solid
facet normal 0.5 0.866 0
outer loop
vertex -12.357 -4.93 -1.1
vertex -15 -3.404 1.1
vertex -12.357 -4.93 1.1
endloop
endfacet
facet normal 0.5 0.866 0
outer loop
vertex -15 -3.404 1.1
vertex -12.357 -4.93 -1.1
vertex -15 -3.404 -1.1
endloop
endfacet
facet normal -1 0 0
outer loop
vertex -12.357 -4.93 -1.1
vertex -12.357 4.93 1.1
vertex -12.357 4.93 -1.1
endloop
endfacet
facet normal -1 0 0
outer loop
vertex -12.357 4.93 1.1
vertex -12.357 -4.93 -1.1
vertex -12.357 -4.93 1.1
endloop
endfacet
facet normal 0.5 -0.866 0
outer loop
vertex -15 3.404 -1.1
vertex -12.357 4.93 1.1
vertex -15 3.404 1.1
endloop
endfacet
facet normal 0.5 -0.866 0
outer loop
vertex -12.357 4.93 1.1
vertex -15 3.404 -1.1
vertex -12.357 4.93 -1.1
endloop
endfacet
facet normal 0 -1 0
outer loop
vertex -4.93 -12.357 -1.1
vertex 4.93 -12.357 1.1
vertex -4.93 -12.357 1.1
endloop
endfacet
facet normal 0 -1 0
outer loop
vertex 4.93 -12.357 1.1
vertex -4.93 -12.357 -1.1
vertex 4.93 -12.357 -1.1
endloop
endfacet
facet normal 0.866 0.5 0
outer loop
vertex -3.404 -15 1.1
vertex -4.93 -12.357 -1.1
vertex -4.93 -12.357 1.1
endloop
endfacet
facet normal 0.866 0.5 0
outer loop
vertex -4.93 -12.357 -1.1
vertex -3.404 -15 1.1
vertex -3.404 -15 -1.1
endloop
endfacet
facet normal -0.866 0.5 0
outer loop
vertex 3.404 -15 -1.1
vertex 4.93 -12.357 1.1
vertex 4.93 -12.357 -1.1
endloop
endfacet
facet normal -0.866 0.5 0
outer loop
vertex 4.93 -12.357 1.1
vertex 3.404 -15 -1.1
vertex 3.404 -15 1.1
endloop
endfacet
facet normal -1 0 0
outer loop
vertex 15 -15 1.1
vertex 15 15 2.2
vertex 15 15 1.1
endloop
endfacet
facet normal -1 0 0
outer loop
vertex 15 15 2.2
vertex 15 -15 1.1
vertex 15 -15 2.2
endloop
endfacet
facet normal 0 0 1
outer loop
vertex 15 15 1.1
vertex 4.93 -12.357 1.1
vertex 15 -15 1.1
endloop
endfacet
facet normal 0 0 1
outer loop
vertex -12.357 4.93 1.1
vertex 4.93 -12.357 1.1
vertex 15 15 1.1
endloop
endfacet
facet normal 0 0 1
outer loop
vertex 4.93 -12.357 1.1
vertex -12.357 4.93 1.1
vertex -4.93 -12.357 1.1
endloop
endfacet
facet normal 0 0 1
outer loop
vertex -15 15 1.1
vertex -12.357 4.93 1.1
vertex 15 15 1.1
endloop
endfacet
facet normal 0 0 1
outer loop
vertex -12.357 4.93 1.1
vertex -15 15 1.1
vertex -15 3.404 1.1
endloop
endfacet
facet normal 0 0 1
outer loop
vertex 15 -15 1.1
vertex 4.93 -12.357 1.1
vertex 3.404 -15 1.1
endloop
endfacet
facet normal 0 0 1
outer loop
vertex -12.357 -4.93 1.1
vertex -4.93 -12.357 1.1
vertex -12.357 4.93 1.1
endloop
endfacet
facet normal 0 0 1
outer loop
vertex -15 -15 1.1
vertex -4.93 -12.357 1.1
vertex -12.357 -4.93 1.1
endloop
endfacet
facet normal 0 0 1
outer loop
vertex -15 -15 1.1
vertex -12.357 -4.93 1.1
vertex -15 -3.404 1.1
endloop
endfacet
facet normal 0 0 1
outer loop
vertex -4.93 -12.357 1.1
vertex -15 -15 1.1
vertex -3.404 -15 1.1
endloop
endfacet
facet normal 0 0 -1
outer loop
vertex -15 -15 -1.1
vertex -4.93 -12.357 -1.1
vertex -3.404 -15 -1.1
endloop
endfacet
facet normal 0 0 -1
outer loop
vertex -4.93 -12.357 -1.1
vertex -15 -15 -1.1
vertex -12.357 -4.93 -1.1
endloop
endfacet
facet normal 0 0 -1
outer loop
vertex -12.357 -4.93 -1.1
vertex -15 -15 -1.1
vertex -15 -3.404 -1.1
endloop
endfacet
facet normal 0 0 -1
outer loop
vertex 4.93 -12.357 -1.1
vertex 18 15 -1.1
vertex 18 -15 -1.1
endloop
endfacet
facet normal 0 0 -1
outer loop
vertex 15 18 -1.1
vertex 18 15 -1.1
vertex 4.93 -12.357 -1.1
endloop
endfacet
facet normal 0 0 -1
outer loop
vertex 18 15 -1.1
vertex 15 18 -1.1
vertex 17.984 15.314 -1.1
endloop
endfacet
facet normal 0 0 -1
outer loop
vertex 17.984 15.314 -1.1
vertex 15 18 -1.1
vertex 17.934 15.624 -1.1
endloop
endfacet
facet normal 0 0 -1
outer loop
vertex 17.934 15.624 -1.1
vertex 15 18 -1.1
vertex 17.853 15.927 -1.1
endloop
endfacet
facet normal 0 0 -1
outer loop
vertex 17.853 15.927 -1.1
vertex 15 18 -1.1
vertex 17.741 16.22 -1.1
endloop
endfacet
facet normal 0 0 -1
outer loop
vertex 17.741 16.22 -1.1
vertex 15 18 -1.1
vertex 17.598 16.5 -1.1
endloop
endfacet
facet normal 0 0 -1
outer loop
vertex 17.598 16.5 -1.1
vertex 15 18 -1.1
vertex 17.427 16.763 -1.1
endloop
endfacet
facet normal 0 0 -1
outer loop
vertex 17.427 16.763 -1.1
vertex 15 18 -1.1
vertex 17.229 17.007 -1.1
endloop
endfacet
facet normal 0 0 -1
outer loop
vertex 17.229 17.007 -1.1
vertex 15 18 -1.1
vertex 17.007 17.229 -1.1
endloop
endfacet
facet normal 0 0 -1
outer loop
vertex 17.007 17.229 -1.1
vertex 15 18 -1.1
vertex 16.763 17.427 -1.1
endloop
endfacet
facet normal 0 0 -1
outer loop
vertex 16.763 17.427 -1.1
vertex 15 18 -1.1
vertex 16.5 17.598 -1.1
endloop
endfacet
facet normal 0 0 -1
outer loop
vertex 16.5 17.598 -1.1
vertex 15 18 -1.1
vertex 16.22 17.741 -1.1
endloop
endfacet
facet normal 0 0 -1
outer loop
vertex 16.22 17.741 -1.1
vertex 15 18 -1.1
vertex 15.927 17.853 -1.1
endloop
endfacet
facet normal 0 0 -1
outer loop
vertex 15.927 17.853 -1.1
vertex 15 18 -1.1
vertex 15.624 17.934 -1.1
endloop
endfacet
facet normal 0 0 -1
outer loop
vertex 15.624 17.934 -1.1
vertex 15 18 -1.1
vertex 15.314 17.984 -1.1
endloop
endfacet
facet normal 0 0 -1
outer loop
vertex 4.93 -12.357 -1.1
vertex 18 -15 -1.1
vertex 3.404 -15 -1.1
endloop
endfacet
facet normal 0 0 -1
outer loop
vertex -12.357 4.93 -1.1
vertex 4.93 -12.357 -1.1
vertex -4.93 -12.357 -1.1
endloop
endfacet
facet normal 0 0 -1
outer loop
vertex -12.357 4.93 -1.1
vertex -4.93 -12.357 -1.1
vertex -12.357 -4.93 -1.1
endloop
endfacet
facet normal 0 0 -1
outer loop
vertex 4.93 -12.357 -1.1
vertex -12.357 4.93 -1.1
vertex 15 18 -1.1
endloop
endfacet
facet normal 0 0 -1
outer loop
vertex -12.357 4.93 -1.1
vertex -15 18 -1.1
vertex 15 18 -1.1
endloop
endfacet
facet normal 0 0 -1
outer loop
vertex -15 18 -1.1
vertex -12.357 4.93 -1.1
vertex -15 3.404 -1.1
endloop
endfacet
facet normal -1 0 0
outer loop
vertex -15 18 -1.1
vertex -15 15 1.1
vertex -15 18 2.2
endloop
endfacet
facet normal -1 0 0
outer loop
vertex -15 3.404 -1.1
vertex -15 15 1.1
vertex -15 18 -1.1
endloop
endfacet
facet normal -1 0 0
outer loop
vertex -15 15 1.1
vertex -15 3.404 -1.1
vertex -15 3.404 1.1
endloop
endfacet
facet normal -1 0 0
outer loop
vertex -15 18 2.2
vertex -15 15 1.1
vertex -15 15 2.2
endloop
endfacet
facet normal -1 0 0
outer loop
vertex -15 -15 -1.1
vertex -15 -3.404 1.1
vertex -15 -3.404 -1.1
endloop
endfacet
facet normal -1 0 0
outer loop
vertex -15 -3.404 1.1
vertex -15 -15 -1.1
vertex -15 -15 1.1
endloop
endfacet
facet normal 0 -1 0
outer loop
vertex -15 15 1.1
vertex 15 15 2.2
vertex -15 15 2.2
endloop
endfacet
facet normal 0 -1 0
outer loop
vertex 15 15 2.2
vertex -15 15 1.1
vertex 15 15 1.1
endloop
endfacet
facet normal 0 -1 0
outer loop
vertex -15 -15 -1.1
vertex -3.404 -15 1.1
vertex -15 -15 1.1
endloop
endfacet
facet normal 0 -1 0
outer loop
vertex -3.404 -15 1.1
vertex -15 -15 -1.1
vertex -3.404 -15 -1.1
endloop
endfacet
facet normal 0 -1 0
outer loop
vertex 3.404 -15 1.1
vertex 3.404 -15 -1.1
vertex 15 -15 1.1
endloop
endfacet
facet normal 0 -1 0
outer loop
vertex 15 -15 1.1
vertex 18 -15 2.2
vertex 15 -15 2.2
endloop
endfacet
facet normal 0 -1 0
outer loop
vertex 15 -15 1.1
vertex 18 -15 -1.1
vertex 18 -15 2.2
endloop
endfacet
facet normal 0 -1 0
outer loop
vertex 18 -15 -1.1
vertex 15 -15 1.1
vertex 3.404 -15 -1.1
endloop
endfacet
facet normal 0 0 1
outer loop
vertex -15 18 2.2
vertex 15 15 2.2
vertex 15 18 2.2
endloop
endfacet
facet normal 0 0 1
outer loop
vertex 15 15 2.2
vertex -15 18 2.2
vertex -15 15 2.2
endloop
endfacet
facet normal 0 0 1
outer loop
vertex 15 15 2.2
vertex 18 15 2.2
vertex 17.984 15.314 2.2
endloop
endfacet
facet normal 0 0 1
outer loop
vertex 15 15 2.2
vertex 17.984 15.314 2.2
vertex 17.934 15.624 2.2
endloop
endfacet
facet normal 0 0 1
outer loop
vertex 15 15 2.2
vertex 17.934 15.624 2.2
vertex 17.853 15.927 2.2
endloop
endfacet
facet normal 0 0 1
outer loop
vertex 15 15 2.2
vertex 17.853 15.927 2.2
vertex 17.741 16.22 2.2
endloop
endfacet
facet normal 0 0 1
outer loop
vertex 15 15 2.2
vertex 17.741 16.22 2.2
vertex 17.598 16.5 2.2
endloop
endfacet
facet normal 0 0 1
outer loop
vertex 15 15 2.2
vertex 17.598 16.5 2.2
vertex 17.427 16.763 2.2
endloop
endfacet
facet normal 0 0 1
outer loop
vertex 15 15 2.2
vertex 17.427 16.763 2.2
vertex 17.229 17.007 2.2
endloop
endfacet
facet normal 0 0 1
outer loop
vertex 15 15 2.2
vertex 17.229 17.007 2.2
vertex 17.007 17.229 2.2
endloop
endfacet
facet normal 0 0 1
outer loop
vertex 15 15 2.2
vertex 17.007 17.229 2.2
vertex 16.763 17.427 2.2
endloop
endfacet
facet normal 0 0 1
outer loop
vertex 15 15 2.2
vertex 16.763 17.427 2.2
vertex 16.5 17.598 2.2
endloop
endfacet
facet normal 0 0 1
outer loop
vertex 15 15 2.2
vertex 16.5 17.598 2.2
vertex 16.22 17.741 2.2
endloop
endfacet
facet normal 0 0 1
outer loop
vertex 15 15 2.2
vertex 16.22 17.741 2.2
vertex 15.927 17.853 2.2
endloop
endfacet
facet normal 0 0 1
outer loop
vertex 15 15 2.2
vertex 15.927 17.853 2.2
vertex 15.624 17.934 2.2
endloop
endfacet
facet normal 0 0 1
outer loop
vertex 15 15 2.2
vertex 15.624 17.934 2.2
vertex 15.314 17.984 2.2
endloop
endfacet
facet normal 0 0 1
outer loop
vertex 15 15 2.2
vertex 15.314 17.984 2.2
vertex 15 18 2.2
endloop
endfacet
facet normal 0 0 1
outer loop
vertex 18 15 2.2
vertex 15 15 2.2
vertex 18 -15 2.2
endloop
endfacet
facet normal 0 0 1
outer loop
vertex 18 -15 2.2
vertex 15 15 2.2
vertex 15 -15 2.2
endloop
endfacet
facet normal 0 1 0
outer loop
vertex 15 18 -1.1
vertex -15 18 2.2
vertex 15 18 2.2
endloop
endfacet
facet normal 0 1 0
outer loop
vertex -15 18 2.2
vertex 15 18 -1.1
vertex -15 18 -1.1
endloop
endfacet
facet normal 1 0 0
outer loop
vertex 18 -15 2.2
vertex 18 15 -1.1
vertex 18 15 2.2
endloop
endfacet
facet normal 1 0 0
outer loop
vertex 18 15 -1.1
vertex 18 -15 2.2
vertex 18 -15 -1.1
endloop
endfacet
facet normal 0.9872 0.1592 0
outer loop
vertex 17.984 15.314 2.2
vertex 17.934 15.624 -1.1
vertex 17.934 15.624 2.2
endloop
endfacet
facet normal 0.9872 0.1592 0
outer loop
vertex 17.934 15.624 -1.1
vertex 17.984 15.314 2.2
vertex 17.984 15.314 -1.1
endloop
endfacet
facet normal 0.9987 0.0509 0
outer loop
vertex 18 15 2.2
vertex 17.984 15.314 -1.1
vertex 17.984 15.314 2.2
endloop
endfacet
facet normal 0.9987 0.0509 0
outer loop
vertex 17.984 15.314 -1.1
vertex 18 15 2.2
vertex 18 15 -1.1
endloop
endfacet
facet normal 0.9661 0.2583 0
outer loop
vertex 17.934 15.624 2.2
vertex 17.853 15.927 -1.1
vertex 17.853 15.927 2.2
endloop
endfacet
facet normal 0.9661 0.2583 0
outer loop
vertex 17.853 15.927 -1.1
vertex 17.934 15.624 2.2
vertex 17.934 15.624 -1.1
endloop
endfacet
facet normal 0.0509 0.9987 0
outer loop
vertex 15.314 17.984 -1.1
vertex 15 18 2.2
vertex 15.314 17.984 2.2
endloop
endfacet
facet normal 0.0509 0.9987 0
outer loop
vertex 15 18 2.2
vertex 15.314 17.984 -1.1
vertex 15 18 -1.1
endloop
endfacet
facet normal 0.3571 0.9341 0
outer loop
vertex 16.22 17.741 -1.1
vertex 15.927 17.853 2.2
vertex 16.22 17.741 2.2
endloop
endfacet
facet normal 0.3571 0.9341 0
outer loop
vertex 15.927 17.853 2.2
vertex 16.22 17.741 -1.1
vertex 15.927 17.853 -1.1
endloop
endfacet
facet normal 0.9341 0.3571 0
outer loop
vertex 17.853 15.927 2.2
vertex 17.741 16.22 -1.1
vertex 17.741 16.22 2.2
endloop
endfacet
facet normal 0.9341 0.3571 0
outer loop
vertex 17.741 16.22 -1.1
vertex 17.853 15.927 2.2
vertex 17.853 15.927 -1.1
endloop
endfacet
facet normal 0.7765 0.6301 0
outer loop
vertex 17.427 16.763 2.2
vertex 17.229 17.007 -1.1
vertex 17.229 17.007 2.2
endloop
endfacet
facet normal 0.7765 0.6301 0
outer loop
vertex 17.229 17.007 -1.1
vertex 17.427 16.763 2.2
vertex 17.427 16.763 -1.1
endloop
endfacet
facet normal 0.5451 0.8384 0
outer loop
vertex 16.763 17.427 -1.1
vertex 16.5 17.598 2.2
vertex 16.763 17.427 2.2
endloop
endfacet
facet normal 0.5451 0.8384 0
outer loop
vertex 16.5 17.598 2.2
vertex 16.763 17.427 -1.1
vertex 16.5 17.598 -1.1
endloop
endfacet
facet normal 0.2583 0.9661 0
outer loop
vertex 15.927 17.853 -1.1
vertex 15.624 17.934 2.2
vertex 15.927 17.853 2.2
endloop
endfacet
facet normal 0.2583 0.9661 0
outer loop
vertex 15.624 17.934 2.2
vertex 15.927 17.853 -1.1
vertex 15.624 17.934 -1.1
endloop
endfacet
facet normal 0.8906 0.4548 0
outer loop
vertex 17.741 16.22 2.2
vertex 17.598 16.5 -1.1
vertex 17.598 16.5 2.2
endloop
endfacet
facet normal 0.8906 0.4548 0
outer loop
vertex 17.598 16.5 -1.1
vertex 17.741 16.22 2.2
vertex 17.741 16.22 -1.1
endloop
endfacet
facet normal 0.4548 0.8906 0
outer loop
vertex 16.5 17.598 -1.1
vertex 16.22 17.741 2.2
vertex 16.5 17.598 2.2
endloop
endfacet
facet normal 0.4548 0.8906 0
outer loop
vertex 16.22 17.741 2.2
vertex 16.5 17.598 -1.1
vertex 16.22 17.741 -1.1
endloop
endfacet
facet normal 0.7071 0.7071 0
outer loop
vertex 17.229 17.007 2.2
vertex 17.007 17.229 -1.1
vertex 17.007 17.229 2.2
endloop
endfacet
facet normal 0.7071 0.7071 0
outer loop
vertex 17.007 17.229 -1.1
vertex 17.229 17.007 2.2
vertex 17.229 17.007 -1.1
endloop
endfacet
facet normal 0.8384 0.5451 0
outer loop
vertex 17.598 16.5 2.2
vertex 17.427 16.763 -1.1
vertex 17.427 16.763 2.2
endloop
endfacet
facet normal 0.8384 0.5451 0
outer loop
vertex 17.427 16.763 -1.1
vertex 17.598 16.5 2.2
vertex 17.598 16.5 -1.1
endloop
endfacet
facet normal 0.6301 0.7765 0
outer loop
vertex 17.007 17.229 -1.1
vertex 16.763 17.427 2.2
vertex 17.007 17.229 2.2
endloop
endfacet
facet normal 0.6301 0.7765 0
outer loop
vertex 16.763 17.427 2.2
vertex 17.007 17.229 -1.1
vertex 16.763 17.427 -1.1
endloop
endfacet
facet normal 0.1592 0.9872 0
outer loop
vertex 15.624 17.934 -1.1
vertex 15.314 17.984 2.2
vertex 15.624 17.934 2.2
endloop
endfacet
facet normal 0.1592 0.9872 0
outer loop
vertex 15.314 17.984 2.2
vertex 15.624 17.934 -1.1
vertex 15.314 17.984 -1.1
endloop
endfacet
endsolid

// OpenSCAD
/*
 * Based on https://www.thingiverse.com/thing:1732292
 *
 * Rewritten for better readability and added a variable to allow for variable
 * connector heights. Renamed some variables/modules to make things more consistent.
 *
 * Roy Sigurd Karlsbakk <roy@karlsbakk.net>
 *
 */

side=30;
//thickness of the board
thickness=2.2;
edge_thickness=3;
connector_height=thickness;
//coefficient of the thickness of the board
edge_height_coef=1.5;//[1:0.1:3]

// printer tolerance (only affect "color 02" parts)
tolerance=0.3;//[0:0.05:0.7]
// definition (only affect corners)
$fn=60;
// [Corner color 01,Corner color 02,Edge color 01,Edge color 02,Center color 01,Center color 02,Test part]
render="Corner color 2";

////////
module slot() {
    translate([-side/2,0,-thickness/2-0.2]) {
        rotate([0,0,180]) {
            translate([0.2,0,0]) {
                hull() {
                    for(i=[-1,1]) {
                        translate([-0.5-2*tolerance/1.75,i*(0.866+2*tolerance),0]) {
                            cylinder(d=8,h=connector_height+0.5,$fn=3);
                        }
                    }
                }
            }
        }
    }
}
module color1(a) {
    cube([side,side,thickness],center=true);
    for(i=[0,90]) {
        rotate([0,0,i]) {
            translate([-side/2,0,-thickness/2]) {
                cylinder(d=10,h=connector_height,$fn=3);
            }
        }
    }
    if (a==2) {
        for(i=[0,-90]) {
            rotate([0,0,i]) {
                translate([-side/2,side/2,-thickness/2]) {
                    cube([side,edge_thickness,edge_height_coef*thickness]);
                }
            }
        }
        difference() {
            translate([side/2,side/2,-thickness/2]) {
                cylinder(r=edge_thickness,h=edge_height_coef*thickness);
            }
            cube([side,side,2*edge_height_coef*thickness],center=true);
        }
    }
    if (a==3) {
        rotate([0,0,180]) {
            translate([-side/2,0,-thickness/2]) {
                cylinder(d=10,h=connector_height,$fn=3);
            }
        }
        translate([-side/2,side/2,-thickness/2]) {
            cube([side,edge_thickness,edge_height_coef*thickness]);
        }
    } else if (a==4) {
        for(i=[180,-90]) {
            rotate([0,0,i]) {
                translate([-side/2,0,-thickness/2]) {
                    cylinder(d=10,h=connector_height,$fn=3);
                }
            }
        }
    }
    else {};
}

module color2(a) {
    difference() {
        cube([side,side,thickness],center=true);
        for(i=[0,90]) {
            rotate([0,0,i]) {
                slot();
            }
        }
        if (a==3) {
            rotate([0,0,180]) {
                 slot();
            }
        }
        else if (a==4) {
            for(i=[180,-90]) {
                rotate([0,0,i]) {
                    slot();
                }
            }
        }
        else {};
    }
    if (a==2) {
        for(i=[0,-90]) {
            rotate([0,0,i]) {
                translate([-side/2,side/2,-thickness/2]) {
                    cube([side,edge_thickness,edge_height_coef*thickness]);
                }
            }
        }
        difference() {
            translate([side/2,side/2,-thickness/2]) {
                cylinder(r=edge_thickness,h=edge_height_coef*thickness);
            }
            cube([side,side,2*edge_height_coef*thickness],center=true);
        }
    }
    if (a==3) {
        translate([-side/2,side/2,-thickness/2]) {
            cube([side,edge_thickness,edge_height_coef*thickness]);
        }
    }
}

if (render=="Corner color 1") {
    color1(2);
}
else if (render=="Corner color 2") {
    color2(2);
}
else if (render=="Edge color 1") {
    color1(3);
}
else if (render=="Edge color 2") {
    color2(3);
}
else if (render=="Center color 1") {
    color1(4);
}
else if (render=="Center color 2") {
    color2(4);
}
else if (render=="Test part") {
    rotate([0,0,180]) translate([-1.5,0,0]) difference() {
        translate([-7.5,0,0]) {
            cube([15,15,thickness],center=true);
            translate([-30/2,0,-thickness/2-0.2]) {
                rotate([0,0,180]) {
                    translate([0.2,0,0]) hull() {
                        for(i=[-1,1]) {
                            translate([-0.5-2*tolerance/1.75,i*(0.866+2*tolerance),0]) {
                                cylinder(d=8,h=thickness/2+0.5,$fn=3);}
                            }
                        }
                    }
                }
            }
        }
        translate([-1.5,0,0]) {
            union() {
                translate([-7.5,0,0]) {
                    cube([15,15,thickness],center=true);
                }
                translate([-30/2,0,-thickness/2]) {
                    cylinder(d=10,h=thickness/2,$fn=3);
                }
            }
    }
}
